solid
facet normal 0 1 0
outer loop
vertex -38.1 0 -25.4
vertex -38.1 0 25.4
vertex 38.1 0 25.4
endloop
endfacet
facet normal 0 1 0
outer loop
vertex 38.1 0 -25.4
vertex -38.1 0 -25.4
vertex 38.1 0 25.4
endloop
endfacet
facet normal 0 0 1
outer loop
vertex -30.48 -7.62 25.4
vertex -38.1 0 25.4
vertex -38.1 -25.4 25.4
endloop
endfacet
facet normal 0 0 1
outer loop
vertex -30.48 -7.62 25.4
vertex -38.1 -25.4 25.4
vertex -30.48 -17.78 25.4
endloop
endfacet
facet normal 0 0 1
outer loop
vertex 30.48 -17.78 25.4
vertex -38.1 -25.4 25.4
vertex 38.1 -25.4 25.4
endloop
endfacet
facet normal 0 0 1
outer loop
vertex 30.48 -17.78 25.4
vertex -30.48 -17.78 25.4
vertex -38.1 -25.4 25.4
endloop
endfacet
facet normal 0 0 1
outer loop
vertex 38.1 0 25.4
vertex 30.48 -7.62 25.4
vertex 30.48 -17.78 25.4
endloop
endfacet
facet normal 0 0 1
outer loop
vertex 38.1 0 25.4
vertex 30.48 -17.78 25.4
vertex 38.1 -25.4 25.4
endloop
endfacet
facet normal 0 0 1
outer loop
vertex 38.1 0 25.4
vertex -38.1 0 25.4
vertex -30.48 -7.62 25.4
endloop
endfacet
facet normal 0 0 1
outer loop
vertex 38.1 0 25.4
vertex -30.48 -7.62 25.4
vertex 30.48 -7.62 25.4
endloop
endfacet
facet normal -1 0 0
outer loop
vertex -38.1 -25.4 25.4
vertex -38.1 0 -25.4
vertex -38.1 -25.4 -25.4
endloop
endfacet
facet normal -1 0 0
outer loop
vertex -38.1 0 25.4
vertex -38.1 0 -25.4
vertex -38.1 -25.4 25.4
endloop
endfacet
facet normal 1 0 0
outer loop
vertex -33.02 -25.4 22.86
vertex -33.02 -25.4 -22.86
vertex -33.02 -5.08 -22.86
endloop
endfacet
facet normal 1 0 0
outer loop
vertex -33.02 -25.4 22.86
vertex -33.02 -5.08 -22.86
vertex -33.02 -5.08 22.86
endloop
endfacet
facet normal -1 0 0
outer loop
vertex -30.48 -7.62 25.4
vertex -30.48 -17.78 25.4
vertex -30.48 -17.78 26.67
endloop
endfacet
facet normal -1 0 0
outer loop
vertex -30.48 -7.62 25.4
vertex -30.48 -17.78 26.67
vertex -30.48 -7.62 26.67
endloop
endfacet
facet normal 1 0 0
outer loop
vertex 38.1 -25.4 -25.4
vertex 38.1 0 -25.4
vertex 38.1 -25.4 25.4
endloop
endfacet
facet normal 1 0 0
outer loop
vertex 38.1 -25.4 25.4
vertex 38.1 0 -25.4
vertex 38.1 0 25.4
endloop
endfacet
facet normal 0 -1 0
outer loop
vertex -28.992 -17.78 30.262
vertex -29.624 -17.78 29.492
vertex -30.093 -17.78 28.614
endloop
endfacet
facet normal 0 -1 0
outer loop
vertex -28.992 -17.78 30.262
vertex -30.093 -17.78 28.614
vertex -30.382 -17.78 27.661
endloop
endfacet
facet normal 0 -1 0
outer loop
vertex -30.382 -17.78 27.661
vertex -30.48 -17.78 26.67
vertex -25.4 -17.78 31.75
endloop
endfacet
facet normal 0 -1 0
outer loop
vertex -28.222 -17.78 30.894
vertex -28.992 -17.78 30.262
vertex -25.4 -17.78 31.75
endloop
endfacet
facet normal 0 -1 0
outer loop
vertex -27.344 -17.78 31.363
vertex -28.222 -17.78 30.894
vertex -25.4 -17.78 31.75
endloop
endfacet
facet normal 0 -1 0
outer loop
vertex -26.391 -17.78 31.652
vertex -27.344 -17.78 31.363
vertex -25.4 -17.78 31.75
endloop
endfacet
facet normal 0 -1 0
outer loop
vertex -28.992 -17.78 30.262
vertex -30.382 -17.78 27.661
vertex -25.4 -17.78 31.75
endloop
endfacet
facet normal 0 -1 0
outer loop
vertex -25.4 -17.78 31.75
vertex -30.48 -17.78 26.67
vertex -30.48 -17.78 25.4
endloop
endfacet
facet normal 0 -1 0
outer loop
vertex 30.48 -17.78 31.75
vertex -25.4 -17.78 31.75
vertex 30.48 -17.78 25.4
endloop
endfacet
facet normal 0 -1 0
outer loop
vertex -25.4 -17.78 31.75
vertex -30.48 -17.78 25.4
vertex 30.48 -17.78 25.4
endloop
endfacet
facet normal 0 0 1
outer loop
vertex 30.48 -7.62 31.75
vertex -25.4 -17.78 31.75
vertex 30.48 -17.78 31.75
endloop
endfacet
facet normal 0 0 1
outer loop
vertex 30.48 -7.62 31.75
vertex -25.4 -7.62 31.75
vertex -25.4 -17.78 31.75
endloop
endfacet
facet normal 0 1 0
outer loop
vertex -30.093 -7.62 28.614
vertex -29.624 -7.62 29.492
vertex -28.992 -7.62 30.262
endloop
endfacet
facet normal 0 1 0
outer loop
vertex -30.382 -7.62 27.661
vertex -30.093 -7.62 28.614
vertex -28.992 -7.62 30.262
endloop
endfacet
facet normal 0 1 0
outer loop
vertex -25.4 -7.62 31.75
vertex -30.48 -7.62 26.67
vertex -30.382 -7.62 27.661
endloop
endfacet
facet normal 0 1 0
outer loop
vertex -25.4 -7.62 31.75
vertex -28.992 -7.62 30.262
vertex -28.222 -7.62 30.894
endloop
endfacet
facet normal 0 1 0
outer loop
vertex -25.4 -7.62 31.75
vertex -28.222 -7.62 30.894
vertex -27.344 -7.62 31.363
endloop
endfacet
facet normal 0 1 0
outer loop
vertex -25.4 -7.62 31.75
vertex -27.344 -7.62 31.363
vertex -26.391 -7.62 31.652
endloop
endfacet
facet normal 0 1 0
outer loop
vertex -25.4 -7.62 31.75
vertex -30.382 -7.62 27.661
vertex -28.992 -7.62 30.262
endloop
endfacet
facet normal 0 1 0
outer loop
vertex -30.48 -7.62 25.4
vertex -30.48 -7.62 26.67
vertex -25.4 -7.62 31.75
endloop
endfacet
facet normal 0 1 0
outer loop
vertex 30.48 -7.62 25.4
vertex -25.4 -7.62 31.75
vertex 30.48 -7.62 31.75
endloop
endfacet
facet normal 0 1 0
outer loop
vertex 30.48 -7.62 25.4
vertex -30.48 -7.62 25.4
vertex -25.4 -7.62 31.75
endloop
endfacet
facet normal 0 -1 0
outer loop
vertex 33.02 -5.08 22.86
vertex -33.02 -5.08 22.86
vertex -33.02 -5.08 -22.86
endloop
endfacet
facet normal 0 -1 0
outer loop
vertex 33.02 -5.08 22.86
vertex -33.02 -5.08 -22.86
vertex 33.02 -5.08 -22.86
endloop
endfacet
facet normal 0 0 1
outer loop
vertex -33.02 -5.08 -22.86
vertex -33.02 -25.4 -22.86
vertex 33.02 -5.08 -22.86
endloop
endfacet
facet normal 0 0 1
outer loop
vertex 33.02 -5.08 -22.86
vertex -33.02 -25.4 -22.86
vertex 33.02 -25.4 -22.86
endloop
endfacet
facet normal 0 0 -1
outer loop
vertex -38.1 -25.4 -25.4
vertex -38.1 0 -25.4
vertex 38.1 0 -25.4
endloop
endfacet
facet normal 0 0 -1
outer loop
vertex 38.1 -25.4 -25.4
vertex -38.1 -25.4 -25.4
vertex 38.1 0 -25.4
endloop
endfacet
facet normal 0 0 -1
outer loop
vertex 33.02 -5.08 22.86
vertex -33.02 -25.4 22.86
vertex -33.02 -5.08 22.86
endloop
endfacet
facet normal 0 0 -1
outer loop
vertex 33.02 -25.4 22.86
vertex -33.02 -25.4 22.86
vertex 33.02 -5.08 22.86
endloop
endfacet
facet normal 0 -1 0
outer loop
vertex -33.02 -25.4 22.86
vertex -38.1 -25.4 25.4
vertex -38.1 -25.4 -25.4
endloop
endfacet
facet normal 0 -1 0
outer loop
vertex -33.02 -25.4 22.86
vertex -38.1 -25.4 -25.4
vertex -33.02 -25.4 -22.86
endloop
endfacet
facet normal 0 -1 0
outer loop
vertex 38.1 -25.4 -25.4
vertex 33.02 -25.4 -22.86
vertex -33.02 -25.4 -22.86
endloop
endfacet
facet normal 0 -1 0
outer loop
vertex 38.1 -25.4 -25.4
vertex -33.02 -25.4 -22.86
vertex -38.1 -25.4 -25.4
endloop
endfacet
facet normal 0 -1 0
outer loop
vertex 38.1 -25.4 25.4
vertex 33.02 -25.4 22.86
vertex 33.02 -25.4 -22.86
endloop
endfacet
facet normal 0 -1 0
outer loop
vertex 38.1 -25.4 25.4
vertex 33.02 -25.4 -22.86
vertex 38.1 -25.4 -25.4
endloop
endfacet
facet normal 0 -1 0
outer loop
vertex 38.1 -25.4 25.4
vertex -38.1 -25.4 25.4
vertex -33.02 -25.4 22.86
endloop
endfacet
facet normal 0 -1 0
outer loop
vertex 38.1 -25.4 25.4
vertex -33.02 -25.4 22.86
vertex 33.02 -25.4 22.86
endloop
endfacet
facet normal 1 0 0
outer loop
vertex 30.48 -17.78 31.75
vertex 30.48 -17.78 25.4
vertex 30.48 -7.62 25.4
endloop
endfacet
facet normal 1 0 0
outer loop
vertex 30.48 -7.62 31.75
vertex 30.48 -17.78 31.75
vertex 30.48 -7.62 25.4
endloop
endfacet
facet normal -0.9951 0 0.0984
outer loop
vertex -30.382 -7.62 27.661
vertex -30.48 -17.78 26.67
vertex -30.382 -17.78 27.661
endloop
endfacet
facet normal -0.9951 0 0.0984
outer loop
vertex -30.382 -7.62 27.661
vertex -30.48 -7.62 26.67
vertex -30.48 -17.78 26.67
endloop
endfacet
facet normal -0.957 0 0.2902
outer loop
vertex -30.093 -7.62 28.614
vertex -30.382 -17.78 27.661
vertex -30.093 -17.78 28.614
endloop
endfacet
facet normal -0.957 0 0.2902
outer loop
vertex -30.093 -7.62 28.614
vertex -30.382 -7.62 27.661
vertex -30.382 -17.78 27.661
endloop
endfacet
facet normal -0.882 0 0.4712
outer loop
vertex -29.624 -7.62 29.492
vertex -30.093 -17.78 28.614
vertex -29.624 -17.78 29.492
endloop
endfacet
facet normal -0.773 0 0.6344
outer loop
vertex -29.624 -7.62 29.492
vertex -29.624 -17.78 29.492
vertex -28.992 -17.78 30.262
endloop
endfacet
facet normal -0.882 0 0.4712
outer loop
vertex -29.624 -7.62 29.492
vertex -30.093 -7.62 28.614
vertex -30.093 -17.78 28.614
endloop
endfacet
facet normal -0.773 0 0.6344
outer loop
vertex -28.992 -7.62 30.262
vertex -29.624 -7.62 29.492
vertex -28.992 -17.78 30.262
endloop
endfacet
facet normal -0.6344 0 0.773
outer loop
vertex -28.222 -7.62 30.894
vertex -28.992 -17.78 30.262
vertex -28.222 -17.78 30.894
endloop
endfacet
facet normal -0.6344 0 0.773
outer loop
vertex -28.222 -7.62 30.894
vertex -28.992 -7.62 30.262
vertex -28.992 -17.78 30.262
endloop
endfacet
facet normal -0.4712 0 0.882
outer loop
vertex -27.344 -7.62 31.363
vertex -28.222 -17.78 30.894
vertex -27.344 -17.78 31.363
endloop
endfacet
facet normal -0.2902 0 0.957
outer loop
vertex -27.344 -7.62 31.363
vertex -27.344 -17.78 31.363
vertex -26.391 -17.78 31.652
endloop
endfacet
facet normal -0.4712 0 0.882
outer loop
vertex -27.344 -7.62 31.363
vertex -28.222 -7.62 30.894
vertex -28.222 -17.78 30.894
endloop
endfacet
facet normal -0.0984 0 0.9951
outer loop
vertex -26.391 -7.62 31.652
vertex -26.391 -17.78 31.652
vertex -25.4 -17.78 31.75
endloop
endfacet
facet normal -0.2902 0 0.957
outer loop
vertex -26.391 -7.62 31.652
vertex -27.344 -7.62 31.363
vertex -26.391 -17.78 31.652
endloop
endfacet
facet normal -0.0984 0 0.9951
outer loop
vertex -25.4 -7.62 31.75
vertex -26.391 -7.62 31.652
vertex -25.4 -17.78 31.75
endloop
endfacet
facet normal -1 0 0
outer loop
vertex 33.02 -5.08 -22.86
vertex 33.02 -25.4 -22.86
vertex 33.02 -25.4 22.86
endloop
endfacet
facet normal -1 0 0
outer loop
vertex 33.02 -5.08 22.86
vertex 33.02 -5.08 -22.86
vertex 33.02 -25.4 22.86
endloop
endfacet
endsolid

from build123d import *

# Parameters (mm, degrees)
F0_W          = 76.2
F0_H          = 50.8
F1_DEPTH      = 25.4
F2_W          = 66.04
F2_H          = 45.72
F3_DEPTH      = 20.32
F3_DEPTH_BACK = 25.4
F4_W          = 60.9600003704
F4_H          = 10.1600003704
F5_DEPTH      = 6.35
F6_R          = 5.08


with BuildPart() as f1:
    # F0 (on Front) → F1 (new body)
    with BuildSketch(Plane.XZ):
        Rectangle(F0_W, F0_H)
    extrude(amount=F1_DEPTH)

    # F2 (on face) → F3 (cut, two sides)
    with BuildSketch(Plane.XZ.offset(25.4)) as f3_sk:
        Rectangle(F2_W, F2_H)
    extrude(amount=-F3_DEPTH, mode=Mode.SUBTRACT)
    extrude(f3_sk.sketch, amount=F3_DEPTH_BACK, mode=Mode.SUBTRACT)

    # F4 (on face) → F5 (join)
    with BuildSketch(Plane.XY.offset(25.4)):
        with Locations((0, -12.7)):
            Rectangle(F4_W, F4_H)
    extrude(amount=F5_DEPTH)

    # F6
    f6_edges = [f1.edges().sort_by_distance(p)[0] for p in [
        (-30.48, -12.7, 31.75),
    ]]
    fillet(f6_edges, radius=F6_R)


solid = f1.part
